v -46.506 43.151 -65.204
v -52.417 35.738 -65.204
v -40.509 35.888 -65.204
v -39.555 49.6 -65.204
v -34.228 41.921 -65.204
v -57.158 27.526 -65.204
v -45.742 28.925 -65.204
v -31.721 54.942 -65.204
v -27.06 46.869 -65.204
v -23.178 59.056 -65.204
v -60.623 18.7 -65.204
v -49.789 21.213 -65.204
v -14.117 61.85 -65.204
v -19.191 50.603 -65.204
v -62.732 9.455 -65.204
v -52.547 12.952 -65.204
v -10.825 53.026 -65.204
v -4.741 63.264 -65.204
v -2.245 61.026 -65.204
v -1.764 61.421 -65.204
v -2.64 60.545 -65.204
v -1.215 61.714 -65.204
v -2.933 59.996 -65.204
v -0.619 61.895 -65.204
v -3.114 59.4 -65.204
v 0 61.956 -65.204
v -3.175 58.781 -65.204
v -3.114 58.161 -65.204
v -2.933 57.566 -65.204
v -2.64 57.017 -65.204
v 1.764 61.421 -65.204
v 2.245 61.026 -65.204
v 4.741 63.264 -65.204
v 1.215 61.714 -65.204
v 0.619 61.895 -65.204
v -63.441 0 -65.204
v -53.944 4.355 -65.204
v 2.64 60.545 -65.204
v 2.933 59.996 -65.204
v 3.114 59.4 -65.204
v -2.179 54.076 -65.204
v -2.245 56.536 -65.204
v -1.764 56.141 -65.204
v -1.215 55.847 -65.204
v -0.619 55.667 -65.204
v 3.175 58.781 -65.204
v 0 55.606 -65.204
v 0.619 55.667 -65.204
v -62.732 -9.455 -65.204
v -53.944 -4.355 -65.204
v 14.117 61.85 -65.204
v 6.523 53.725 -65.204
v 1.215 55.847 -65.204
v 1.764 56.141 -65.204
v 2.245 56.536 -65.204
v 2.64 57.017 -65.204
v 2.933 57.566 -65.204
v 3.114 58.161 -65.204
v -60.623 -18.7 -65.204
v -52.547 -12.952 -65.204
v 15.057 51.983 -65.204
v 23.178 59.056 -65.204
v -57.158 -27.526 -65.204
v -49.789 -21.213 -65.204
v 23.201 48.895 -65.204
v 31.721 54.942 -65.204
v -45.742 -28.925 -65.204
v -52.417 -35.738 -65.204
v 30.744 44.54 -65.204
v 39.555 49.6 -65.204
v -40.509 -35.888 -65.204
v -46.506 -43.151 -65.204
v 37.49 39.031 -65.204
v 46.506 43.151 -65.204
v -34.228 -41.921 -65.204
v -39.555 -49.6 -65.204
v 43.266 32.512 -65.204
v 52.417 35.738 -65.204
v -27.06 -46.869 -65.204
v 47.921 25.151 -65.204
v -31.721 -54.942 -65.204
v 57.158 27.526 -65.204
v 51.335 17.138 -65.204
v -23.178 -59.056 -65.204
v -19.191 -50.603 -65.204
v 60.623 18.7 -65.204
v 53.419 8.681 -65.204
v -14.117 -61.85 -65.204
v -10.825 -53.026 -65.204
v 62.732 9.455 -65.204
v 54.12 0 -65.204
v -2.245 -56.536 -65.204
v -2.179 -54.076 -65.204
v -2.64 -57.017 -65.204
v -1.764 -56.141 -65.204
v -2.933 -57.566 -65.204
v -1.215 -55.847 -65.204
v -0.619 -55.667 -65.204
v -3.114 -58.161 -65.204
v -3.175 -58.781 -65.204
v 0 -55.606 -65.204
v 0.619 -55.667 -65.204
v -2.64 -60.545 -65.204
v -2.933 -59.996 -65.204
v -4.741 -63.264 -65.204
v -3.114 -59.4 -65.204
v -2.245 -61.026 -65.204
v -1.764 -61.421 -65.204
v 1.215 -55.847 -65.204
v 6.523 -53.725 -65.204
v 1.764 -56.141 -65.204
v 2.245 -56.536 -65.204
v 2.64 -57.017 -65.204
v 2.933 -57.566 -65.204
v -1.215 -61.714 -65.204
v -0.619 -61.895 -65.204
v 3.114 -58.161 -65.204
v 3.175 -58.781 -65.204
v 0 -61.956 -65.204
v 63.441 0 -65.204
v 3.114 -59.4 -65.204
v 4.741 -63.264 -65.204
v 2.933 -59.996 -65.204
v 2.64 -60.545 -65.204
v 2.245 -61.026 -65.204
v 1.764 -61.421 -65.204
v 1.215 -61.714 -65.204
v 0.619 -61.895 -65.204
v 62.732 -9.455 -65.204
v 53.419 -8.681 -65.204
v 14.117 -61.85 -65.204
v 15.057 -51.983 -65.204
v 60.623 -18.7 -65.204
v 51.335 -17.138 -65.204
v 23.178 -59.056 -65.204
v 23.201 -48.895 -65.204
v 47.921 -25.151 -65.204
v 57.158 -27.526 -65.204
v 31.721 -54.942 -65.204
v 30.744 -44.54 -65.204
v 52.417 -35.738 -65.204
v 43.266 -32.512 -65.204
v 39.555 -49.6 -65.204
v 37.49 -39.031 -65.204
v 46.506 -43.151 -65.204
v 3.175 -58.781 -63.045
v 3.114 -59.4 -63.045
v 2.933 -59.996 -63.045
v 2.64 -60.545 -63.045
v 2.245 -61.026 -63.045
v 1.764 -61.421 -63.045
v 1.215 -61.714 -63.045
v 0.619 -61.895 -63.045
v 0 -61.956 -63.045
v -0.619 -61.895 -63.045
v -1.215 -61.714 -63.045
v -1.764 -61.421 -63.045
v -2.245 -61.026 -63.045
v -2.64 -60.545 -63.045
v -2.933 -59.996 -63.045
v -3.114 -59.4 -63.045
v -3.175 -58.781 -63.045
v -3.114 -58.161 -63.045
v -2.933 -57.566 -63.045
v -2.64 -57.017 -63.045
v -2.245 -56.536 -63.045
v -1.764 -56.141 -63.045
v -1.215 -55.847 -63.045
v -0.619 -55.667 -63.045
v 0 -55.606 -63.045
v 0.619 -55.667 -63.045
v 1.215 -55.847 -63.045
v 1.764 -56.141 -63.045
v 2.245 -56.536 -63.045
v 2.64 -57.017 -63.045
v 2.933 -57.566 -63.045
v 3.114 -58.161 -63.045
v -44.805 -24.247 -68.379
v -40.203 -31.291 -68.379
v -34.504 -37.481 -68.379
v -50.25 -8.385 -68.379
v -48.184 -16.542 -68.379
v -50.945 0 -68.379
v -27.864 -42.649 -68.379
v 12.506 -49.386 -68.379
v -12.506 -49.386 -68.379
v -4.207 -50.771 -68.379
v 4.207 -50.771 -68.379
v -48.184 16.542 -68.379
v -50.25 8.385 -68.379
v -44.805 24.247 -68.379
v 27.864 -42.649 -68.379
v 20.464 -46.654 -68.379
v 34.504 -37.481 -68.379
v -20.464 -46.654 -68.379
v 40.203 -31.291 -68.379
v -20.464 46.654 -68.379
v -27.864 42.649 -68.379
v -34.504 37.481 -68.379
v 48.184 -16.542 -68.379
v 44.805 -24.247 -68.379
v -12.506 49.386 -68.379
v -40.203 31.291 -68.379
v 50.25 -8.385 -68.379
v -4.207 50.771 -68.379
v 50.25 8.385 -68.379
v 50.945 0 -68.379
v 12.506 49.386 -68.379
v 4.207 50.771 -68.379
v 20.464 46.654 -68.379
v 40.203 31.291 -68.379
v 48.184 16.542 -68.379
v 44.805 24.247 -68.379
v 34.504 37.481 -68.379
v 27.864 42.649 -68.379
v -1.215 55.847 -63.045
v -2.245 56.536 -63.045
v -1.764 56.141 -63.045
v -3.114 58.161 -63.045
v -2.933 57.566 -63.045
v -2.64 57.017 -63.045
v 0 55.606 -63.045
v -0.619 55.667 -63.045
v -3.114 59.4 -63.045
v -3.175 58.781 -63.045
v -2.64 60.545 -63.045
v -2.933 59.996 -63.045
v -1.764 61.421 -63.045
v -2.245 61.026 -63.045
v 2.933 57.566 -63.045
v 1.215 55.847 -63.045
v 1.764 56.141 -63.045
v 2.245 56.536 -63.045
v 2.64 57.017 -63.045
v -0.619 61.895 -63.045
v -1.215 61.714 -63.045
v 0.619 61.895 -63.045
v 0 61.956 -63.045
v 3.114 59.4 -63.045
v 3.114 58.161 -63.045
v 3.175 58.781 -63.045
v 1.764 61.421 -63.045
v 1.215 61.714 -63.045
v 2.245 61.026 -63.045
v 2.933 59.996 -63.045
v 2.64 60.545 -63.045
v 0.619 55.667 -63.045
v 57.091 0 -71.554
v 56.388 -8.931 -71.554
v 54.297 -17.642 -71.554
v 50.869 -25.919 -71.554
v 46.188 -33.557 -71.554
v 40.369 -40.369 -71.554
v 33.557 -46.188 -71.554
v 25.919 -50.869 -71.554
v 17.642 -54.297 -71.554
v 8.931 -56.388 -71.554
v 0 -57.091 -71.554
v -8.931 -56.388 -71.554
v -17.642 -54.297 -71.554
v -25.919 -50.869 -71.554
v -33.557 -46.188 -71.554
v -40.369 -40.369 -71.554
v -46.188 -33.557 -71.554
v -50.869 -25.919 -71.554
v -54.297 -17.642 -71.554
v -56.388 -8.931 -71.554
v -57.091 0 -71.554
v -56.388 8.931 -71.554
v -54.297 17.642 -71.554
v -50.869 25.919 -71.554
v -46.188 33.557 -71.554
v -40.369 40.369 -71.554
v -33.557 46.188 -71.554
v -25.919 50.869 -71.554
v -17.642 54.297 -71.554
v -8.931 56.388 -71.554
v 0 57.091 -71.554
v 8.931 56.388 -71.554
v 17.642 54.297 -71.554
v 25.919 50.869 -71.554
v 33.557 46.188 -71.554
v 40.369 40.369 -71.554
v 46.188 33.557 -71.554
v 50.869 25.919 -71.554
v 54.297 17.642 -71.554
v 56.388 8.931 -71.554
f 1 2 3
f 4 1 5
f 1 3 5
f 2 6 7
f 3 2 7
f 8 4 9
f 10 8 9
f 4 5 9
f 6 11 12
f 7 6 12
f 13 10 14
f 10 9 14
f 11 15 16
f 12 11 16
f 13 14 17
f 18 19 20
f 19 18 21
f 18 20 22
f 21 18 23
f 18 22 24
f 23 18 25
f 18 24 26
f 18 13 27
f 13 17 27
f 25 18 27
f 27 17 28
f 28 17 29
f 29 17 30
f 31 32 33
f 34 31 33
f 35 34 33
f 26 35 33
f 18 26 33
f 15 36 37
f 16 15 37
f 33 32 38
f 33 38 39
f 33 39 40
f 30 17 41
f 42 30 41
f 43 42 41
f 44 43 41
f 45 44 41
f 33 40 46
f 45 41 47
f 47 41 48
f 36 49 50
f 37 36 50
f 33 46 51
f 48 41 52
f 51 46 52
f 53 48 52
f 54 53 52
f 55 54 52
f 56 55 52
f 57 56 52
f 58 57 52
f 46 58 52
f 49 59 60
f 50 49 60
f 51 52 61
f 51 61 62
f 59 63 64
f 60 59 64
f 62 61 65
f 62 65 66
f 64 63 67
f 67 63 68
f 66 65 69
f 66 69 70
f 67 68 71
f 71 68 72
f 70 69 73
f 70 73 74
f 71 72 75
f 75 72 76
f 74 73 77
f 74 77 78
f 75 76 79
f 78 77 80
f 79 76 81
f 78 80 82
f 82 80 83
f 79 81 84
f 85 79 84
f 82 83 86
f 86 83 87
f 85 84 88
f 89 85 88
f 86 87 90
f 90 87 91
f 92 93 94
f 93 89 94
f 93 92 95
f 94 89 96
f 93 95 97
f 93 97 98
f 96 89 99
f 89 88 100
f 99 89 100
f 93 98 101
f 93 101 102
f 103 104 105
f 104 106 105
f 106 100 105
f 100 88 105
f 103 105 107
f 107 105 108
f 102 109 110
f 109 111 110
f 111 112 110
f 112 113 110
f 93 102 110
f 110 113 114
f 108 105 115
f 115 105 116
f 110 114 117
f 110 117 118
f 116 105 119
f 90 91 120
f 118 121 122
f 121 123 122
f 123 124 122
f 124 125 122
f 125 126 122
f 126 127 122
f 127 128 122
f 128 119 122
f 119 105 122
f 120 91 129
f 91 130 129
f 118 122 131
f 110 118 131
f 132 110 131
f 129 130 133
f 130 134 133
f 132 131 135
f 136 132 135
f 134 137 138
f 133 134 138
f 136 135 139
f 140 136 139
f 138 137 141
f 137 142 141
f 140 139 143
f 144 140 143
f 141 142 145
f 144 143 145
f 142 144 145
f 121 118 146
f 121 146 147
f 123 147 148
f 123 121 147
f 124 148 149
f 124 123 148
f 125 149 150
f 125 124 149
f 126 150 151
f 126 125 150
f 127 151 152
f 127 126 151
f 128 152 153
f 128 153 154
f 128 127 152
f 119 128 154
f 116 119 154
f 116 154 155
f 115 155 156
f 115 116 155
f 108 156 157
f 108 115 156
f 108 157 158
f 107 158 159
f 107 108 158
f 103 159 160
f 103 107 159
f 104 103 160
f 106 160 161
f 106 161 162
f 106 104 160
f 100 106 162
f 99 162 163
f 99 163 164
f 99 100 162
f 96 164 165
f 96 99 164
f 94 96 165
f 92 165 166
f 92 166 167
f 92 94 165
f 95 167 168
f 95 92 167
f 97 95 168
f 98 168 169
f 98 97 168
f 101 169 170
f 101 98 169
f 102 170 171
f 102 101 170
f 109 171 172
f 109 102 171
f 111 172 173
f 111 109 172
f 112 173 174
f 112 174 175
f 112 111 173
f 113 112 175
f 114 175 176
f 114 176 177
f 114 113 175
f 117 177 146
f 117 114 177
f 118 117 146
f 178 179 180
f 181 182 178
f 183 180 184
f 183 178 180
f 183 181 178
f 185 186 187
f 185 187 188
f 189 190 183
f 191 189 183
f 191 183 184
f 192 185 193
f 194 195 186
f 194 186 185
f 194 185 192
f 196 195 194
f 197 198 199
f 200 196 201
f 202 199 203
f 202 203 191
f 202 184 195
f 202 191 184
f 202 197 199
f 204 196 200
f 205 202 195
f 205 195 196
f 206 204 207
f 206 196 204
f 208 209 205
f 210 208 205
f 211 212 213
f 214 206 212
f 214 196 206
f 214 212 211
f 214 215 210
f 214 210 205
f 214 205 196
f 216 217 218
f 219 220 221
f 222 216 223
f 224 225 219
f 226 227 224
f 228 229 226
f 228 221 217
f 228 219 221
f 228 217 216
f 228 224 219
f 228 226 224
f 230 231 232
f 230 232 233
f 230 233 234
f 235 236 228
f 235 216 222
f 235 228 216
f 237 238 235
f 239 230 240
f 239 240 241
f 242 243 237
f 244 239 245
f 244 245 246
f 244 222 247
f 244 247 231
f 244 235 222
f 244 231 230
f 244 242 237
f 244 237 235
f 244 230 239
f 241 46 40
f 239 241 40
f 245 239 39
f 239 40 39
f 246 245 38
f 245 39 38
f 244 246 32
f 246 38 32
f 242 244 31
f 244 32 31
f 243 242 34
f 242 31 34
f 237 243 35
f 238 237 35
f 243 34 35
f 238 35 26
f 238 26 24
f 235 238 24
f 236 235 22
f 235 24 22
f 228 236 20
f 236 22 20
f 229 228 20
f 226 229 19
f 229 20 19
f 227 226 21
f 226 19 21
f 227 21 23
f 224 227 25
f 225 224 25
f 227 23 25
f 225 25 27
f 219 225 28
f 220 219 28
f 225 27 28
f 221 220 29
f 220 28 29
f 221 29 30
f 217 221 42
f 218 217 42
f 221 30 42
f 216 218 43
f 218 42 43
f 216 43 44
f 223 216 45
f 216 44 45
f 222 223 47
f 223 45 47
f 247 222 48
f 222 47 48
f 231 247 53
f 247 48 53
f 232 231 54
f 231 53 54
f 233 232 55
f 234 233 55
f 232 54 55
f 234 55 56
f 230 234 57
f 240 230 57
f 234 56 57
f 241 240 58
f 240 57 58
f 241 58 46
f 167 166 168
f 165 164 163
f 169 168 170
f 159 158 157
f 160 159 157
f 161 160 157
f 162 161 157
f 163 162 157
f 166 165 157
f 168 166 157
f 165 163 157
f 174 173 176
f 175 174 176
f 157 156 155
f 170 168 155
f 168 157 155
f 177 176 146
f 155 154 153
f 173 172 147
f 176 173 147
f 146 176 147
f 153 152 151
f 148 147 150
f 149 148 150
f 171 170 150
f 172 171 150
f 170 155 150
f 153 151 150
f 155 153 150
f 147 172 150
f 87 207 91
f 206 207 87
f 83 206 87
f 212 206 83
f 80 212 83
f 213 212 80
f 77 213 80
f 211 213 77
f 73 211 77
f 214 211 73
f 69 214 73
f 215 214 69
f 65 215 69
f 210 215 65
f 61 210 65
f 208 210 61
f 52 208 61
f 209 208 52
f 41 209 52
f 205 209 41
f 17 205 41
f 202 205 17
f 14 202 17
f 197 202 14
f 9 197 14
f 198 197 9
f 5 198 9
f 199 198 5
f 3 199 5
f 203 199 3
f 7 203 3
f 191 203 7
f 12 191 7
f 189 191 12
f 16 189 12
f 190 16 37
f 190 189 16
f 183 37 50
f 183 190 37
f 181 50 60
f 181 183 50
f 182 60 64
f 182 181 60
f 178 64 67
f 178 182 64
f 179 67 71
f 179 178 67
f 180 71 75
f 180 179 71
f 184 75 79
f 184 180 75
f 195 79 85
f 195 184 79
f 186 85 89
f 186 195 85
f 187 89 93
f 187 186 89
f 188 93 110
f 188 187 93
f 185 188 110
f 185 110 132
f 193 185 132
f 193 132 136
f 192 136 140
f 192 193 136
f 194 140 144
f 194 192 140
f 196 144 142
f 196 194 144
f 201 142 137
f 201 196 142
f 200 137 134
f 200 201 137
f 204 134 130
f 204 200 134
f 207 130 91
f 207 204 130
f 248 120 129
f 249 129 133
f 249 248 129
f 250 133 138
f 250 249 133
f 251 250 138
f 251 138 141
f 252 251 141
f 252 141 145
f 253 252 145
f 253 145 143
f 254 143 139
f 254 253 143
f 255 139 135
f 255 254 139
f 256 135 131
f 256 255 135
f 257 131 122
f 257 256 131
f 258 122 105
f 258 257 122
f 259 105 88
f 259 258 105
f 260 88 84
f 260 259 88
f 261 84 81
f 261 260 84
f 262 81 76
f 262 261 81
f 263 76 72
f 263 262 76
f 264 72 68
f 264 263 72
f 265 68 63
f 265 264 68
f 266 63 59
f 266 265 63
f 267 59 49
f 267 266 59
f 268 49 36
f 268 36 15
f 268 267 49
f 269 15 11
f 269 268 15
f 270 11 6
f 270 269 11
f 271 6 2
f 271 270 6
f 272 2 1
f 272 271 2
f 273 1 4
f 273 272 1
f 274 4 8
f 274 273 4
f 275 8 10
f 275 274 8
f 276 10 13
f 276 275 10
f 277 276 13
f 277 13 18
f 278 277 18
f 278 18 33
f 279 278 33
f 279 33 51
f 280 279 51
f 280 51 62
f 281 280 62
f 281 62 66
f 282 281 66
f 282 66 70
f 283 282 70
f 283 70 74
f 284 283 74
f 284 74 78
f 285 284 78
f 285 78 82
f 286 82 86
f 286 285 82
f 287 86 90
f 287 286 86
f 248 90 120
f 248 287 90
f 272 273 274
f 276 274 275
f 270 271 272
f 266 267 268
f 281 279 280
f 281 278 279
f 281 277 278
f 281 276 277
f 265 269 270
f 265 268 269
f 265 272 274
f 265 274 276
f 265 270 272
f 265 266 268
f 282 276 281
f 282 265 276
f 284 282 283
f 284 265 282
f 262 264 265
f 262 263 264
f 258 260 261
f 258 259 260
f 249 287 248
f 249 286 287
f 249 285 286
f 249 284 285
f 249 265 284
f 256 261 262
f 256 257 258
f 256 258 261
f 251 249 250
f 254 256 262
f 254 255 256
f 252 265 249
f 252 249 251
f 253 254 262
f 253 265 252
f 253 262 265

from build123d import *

# Parameters (mm, degrees)
F0_R      = 50.8
F1_DEPTH  = 38.1
F1_TAPER  = 35
F2_R      = 44.45
F3_DEPTH  = 31.75
F3_TAPER  = 35
F6_R      = 6.35
F13_W     = 40.0871150196
F13_H     = 221.6413393617
F14_DEPTH = 38.1
F16_R     = 63.4410735664
F17_DEPTH = 6.35
F17_TAPER = 45
F18_R     = 54.1198096159
F19_DEPTH = 3.175
F19_TAPER = 45
F20_R     = 2.38125
F21_DEPTH = 6.35
F23_W     = 544.7718501091
F23_H     = 283.927500248
F24_DEPTH = 65.204810909
F25_R     = 3.175
F26_DEPTH = 2.159


# Not quite as in the source:
# - a feature of the source that left no trace in its solid (it failed there, or was rolled back) is left out
# - a feature names something its author has since deleted; it is built from what else it names


with BuildPart() as f1:
    # F0 (on Top) → F1 (new body)
    with BuildSketch(Plane.XY):
        Circle(F0_R)
    extrude(amount=-F1_DEPTH, taper=F1_TAPER)

    # F2 (on face) → F3 (cut)
    with BuildSketch(Plane.XY):
        Circle(F2_R)
    extrude(amount=-F3_DEPTH, taper=F3_TAPER, mode=Mode.SUBTRACT)

    # F9: F7 across plane


with BuildPart() as f7:
    # F7: sweep along a path in F4
    with BuildLine(Plane.YZ) as f7_path:
        add(Plane.YZ * Edge.make_bspline(
            [(-50.8, 0), (-59.5457513783, -8.9993874064), (-82.8005315743, -30.8254243712), (-59.2938947205, -72.9983075974), (-50.8, -97.5854156721)],
            knots=[0, 0, 0, 0, 0.421582605, 1, 1, 1, 1], degree=3))
    # F6 (on plane+point) → F7 (sweep)
    with BuildSketch(Plane.XZ.offset(50.8)):
        with Locations((0, -6.35)):
            Circle(F6_R)
    sweep(path=f7_path.line)


with BuildPart() as f1_1:
    add(f1.part)
    add(f7.part.mirror(Plane.XZ))


with BuildPart() as f14_tool:
    # F13 (on plane+point) → F14 (new body)
    with BuildSketch(Plane.XY.offset(-103.303810809)):
        with Locations((2.3701563478, 10.5300284922)):
            Rectangle(F13_W, F13_H)
    extrude(amount=F14_DEPTH)


with BuildPart() as f1_2:
    add(f1_1.part)

    # F14: cut by f14_tool
    add(f14_tool.part, mode=Mode.SUBTRACT)



with BuildPart() as f7_1:
    add(f7.part)

    # F14: cut by f14_tool
    add(f14_tool.part, mode=Mode.SUBTRACT)


with BuildPart() as f1_3:
    add(f1_2.part)

    add(f7_1.part)  # F17 merges F7
    # F16 (on face) → F17 (join)
    with BuildSketch(Plane(origin=(0, 0, -65.203810809), x_dir=(1, 0, 0), z_dir=(0, 0, -1))):
        Circle(F16_R)
    extrude(amount=F17_DEPTH, taper=F17_TAPER)

    # F18 (on face) → F19 (cut)
    with BuildSketch(Plane.XY.offset(-65.203810809)):
        Circle(F18_R)
    extrude(amount=-F19_DEPTH, taper=F19_TAPER, mode=Mode.SUBTRACT)

    # F20 (on face) → F21 (cut, through all)
    with BuildSketch(Plane.XY.offset(-31.75)):
        Circle(F20_R)
    extrude(amount=-F21_DEPTH, mode=Mode.SUBTRACT)

    # F23 (on offset) → F24 (cut, through all)
    with BuildSketch(Plane.XY.offset(-65.203810809)):
        Rectangle(F23_W, F23_H)
    extrude(amount=F24_DEPTH, mode=Mode.SUBTRACT)

    # F25 (on face) → F26 (join)
    with BuildSketch(Plane.XY.offset(-65.203810809)):
        with Locations((0, 58.78068)):
            Circle(F25_R)
    f26 = extrude(amount=F26_DEPTH)

    # F27: F26 across plane
    add(f26.mirror(Plane.XZ))


solid = f1_3.part
